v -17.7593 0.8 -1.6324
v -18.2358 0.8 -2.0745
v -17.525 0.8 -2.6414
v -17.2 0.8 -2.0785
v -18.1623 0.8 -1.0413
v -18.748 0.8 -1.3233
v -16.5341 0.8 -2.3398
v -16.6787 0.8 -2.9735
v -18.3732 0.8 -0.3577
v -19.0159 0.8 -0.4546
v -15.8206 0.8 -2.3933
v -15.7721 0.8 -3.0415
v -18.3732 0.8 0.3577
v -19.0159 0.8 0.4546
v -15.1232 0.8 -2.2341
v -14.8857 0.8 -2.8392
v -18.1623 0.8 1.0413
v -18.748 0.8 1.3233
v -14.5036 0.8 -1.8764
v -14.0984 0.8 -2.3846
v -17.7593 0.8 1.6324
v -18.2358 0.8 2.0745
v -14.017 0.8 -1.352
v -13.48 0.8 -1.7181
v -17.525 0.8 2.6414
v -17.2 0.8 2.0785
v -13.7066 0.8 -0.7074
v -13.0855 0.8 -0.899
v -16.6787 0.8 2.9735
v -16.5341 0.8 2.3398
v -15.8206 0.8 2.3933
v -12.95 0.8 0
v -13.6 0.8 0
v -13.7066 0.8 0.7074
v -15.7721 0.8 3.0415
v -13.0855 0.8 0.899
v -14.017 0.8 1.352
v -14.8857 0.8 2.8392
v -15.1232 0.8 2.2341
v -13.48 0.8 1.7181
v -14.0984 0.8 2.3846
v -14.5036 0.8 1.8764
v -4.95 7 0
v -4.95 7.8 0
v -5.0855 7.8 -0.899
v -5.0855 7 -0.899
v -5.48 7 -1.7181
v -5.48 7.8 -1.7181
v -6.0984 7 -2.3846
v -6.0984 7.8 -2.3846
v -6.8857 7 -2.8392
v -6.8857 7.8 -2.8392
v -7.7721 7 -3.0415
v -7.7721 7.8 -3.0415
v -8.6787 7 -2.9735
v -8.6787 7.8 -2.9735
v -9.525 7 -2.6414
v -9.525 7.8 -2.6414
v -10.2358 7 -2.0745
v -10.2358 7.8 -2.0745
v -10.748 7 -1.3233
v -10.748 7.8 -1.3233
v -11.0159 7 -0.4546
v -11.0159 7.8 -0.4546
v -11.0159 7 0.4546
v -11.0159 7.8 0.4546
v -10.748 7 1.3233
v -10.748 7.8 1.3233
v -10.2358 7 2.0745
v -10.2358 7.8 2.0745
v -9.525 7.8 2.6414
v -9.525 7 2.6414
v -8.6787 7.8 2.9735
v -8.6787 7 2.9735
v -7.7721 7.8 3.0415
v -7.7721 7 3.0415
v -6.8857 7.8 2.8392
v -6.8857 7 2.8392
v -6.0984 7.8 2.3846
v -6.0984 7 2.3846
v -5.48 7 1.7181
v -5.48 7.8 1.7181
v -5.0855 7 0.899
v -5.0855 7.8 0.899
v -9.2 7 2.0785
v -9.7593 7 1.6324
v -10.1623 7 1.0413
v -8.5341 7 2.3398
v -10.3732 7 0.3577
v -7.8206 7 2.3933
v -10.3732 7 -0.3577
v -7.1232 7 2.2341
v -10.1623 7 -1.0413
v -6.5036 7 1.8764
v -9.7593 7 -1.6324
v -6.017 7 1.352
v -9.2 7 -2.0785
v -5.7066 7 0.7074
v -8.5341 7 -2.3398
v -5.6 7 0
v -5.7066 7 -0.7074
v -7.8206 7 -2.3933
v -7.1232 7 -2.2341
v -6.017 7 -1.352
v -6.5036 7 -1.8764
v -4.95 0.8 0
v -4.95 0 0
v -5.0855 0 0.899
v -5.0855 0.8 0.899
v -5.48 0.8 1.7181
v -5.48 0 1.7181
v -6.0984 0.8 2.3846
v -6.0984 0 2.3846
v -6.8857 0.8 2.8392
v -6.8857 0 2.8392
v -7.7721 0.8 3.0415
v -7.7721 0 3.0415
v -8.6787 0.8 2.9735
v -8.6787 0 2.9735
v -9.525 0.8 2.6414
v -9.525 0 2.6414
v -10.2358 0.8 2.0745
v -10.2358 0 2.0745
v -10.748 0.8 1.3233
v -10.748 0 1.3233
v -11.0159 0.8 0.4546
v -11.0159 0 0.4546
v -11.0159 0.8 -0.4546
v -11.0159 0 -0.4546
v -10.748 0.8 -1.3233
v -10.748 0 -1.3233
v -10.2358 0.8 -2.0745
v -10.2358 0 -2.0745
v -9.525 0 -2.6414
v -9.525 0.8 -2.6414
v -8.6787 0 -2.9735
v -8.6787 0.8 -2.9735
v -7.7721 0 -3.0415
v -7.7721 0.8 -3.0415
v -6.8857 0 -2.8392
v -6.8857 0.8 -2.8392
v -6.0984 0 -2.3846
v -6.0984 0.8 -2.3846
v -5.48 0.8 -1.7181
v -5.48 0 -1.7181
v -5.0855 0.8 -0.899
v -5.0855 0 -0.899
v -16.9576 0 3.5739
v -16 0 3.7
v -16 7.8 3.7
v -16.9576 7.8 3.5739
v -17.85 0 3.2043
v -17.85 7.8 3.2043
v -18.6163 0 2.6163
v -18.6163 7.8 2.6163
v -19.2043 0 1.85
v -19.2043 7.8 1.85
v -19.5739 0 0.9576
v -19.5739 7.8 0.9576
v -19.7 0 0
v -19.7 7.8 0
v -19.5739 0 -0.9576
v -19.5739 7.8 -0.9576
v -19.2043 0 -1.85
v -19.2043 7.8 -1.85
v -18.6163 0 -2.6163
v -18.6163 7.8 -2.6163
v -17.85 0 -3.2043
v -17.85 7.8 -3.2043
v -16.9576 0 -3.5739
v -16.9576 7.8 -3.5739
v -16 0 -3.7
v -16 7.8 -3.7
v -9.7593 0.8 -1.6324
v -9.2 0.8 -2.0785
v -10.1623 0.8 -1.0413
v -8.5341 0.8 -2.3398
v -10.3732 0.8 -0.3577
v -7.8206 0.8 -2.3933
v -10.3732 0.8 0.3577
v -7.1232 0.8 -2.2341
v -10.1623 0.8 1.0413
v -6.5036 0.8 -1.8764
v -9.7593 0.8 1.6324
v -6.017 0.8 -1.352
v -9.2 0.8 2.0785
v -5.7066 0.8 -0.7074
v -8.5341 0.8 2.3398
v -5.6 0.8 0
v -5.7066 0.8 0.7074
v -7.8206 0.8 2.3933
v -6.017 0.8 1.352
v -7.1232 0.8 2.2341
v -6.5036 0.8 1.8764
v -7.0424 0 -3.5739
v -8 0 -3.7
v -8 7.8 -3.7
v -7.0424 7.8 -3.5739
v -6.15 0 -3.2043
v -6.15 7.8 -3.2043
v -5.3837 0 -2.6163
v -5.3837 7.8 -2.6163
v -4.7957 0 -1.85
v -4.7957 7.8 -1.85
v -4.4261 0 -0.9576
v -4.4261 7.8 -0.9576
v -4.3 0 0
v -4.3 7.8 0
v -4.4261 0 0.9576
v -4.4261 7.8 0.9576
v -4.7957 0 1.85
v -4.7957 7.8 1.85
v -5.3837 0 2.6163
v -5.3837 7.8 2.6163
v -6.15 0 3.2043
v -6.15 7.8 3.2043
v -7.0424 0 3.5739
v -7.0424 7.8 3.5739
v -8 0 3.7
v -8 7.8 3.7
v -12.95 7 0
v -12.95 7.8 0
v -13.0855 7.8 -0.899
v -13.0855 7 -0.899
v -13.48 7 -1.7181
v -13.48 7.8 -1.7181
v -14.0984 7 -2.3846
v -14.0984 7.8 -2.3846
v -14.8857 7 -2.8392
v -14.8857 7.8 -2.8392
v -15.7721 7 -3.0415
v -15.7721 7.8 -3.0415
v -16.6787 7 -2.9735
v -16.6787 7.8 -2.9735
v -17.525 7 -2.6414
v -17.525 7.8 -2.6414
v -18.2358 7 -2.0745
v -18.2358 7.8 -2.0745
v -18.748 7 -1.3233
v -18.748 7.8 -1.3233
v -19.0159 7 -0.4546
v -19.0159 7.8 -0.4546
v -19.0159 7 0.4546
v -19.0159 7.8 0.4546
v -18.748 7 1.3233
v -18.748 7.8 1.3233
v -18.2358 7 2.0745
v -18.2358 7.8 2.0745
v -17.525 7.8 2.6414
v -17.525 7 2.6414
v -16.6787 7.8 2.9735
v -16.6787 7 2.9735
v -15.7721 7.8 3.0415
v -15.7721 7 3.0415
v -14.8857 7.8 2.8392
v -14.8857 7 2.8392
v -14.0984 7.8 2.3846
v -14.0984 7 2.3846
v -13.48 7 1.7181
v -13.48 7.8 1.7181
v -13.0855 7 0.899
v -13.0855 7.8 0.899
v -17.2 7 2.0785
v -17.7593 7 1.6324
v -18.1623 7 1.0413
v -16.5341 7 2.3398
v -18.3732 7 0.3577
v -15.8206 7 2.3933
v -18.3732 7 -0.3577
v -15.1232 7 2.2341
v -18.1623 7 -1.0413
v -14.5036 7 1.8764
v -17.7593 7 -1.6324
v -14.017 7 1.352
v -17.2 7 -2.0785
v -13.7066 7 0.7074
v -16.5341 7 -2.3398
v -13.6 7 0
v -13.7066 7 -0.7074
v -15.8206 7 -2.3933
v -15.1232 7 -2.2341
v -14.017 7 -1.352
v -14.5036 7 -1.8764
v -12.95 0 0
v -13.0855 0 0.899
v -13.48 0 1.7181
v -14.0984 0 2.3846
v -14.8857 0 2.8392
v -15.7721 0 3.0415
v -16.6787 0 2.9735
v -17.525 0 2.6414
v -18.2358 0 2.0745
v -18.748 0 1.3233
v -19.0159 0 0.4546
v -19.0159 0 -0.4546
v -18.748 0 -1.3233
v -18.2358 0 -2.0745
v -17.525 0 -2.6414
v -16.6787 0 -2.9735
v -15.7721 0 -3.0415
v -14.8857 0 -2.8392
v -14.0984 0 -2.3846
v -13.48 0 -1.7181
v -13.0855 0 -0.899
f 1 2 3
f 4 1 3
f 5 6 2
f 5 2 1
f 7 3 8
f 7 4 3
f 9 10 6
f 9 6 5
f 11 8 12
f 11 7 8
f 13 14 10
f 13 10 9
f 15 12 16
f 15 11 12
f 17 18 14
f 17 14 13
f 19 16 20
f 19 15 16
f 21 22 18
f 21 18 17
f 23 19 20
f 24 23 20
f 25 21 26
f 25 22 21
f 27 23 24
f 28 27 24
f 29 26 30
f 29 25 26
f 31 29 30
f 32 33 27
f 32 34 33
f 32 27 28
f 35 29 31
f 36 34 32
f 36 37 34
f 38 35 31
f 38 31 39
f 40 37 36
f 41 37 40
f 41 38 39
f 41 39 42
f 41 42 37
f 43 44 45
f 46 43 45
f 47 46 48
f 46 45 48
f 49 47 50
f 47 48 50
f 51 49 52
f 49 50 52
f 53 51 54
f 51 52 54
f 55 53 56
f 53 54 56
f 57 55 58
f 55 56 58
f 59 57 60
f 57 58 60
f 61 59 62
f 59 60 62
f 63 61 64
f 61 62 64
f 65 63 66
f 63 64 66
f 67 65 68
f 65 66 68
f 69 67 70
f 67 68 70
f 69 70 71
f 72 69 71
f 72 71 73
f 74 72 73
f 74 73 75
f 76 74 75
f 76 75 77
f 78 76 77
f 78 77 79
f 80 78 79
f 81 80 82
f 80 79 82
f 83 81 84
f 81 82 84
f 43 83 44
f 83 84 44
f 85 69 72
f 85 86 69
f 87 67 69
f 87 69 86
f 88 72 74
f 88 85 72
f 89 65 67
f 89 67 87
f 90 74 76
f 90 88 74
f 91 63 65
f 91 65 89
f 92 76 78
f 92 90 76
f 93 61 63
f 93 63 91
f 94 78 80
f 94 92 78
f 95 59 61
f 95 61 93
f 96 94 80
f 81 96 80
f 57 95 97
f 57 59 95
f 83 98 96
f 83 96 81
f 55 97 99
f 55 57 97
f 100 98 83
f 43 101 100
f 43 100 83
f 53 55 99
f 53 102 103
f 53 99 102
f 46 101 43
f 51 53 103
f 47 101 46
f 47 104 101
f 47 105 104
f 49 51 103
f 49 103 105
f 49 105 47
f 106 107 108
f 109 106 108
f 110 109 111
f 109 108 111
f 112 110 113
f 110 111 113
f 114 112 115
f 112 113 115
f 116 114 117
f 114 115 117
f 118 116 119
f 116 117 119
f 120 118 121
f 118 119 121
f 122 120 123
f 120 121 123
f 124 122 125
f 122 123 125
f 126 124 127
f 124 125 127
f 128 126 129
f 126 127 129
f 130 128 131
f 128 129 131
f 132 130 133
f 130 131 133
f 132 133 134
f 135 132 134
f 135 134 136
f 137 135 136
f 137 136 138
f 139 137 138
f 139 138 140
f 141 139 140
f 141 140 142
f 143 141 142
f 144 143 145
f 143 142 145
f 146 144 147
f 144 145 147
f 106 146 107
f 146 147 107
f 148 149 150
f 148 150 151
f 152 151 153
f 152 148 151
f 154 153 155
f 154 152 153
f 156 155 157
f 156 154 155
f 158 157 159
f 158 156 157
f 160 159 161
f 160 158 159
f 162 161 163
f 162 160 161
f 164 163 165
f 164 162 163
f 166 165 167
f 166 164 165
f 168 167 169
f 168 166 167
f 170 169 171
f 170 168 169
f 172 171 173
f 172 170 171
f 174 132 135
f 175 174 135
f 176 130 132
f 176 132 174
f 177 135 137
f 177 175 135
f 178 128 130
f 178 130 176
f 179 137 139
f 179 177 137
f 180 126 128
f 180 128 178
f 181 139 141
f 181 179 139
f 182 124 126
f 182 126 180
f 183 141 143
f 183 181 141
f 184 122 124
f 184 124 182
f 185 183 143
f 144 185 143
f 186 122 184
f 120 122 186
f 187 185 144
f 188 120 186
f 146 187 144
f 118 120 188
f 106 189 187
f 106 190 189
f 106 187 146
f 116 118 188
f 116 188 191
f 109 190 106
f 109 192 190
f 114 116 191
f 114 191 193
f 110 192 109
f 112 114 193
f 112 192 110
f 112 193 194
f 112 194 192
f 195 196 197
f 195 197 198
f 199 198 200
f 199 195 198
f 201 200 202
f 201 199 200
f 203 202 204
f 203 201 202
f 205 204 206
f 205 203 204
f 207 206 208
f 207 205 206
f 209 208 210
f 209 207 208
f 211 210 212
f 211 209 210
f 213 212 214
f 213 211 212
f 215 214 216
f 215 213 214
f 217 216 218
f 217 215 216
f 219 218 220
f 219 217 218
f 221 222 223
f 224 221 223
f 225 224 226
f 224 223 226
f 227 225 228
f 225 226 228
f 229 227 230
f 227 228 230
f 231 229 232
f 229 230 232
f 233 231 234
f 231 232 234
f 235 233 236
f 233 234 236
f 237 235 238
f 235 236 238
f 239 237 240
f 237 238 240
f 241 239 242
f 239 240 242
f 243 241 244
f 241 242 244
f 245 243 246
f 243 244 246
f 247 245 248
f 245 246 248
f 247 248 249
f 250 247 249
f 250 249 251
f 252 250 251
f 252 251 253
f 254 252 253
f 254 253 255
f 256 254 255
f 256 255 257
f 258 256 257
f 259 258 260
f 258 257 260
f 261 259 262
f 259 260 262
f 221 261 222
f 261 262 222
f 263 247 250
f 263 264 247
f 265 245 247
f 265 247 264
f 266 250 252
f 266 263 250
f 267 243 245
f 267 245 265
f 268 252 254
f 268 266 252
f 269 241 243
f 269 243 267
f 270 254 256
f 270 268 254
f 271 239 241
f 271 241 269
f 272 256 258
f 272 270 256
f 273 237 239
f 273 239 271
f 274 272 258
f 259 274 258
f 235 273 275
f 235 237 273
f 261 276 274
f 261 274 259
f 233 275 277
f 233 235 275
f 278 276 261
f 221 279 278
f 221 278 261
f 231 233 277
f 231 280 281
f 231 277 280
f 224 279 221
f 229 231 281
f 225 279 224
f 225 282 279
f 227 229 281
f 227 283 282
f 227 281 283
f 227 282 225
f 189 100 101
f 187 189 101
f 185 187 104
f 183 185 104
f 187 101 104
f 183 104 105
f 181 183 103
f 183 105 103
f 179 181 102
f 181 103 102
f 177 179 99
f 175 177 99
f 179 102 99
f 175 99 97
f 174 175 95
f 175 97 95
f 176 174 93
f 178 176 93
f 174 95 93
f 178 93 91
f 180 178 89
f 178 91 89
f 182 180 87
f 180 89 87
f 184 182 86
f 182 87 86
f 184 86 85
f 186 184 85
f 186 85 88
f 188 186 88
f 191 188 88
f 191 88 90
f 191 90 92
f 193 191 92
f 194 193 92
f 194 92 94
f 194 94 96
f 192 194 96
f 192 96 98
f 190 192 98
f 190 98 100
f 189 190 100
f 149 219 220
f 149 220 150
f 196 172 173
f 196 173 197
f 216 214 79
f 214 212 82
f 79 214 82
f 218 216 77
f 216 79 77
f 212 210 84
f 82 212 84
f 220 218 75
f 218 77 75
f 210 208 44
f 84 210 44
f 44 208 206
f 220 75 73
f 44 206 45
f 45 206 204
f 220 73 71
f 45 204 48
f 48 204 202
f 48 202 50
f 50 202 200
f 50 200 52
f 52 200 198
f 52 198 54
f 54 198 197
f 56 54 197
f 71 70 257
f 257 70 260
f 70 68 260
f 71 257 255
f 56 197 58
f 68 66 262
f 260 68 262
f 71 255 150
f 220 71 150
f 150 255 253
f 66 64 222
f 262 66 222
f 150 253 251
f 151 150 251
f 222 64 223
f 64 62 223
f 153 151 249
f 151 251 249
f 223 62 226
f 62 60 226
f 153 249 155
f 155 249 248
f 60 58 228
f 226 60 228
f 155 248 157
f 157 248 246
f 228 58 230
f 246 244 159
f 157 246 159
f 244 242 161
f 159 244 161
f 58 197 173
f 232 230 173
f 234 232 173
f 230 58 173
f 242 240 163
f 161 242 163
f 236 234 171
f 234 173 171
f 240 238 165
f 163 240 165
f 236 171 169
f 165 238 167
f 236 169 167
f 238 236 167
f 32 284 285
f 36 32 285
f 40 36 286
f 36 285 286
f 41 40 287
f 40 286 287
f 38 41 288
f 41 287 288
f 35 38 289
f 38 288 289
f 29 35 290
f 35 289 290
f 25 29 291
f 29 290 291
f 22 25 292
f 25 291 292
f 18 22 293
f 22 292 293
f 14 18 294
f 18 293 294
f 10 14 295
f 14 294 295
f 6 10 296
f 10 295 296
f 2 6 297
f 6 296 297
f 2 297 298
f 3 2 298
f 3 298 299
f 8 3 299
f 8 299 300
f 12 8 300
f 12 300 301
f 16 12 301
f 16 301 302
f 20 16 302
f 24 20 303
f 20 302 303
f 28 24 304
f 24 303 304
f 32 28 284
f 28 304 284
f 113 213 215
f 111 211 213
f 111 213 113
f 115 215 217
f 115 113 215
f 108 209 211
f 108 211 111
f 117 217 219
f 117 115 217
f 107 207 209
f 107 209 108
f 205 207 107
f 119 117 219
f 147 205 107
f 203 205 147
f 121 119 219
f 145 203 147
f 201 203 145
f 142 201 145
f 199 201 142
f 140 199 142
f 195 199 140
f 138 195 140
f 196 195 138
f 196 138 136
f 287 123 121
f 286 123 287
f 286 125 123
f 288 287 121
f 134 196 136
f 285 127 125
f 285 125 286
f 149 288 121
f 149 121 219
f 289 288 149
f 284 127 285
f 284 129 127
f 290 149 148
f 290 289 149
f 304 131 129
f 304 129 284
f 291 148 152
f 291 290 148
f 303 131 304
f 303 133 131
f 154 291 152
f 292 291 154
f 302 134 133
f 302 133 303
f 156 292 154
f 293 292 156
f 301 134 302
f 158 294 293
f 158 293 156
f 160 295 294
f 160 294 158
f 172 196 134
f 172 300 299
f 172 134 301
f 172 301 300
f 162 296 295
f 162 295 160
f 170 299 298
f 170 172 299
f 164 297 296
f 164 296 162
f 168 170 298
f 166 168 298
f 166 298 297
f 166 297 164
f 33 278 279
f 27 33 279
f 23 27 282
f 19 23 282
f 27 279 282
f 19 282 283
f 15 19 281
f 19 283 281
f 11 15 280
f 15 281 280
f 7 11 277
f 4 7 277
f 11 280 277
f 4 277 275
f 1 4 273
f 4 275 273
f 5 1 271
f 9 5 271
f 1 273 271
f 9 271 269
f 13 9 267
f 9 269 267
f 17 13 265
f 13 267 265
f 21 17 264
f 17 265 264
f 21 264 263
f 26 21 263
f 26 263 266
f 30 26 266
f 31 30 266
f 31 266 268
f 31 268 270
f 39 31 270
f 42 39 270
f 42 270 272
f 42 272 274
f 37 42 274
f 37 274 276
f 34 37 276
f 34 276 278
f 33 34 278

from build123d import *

# Parameters (mm, degrees)
BOSS_EXTRUDE3_DEPTH = 7.8
SKETCH2_R           = 2.4
CUT_EXTRUDE6_DEPTH  = 7.8
SKETCH3_R           = 3.05
CUT_EXTRUDE7_DEPTH  = 0.8
SKETCH4_R           = 3.05
CUT_EXTRUDE8_DEPTH  = 0.8


with BuildPart() as part:
    # Sketch1 → Boss-Extrude3 (new body)
    with BuildSketch(Plane(origin=(0, 0, 0), x_dir=(1, 0, 0), z_dir=(0, 1, 0))):
        with BuildLine():
            Line((-16, 3.7), (-8, 3.7))
            ThreePointArc((-8, 3.7), (-4.3, 0), (-8, -3.7))
            Line((-8, -3.7), (-16, -3.7))
            ThreePointArc((-16, -3.7), (-19.7, 0), (-16, 3.7))
        make_face()
    extrude(amount=BOSS_EXTRUDE3_DEPTH)

    # Sketch2 → Cut-Extrude6 (cut)
    with BuildSketch(Plane(origin=(0, 7.8, 0), x_dir=(1, 0, 0), z_dir=(0, 1, 0))):
        with Locations((-16, 0)):
            Circle(SKETCH2_R)
        with Locations((-8, 0)):
            Circle(SKETCH2_R)
    extrude(amount=-CUT_EXTRUDE6_DEPTH, mode=Mode.SUBTRACT)

    # Sketch3 → Cut-Extrude7 (cut)
    with BuildSketch(Plane(origin=(0, 7.8, 0), x_dir=(1, 0, 0), z_dir=(0, 1, 0))):
        with Locations((-16, 0)):
            Circle(SKETCH3_R)
        with Locations((-8, 0)):
            Circle(SKETCH3_R)
    extrude(amount=-CUT_EXTRUDE7_DEPTH, mode=Mode.SUBTRACT)

    # Sketch4 → Cut-Extrude8 (cut)
    with BuildSketch(Plane.XZ):
        with Locations((-16, 0)):
            Circle(SKETCH4_R)
        with Locations((-8, 0)):
            Circle(SKETCH4_R)
    extrude(amount=-CUT_EXTRUDE8_DEPTH, mode=Mode.SUBTRACT)


solid = part.part
